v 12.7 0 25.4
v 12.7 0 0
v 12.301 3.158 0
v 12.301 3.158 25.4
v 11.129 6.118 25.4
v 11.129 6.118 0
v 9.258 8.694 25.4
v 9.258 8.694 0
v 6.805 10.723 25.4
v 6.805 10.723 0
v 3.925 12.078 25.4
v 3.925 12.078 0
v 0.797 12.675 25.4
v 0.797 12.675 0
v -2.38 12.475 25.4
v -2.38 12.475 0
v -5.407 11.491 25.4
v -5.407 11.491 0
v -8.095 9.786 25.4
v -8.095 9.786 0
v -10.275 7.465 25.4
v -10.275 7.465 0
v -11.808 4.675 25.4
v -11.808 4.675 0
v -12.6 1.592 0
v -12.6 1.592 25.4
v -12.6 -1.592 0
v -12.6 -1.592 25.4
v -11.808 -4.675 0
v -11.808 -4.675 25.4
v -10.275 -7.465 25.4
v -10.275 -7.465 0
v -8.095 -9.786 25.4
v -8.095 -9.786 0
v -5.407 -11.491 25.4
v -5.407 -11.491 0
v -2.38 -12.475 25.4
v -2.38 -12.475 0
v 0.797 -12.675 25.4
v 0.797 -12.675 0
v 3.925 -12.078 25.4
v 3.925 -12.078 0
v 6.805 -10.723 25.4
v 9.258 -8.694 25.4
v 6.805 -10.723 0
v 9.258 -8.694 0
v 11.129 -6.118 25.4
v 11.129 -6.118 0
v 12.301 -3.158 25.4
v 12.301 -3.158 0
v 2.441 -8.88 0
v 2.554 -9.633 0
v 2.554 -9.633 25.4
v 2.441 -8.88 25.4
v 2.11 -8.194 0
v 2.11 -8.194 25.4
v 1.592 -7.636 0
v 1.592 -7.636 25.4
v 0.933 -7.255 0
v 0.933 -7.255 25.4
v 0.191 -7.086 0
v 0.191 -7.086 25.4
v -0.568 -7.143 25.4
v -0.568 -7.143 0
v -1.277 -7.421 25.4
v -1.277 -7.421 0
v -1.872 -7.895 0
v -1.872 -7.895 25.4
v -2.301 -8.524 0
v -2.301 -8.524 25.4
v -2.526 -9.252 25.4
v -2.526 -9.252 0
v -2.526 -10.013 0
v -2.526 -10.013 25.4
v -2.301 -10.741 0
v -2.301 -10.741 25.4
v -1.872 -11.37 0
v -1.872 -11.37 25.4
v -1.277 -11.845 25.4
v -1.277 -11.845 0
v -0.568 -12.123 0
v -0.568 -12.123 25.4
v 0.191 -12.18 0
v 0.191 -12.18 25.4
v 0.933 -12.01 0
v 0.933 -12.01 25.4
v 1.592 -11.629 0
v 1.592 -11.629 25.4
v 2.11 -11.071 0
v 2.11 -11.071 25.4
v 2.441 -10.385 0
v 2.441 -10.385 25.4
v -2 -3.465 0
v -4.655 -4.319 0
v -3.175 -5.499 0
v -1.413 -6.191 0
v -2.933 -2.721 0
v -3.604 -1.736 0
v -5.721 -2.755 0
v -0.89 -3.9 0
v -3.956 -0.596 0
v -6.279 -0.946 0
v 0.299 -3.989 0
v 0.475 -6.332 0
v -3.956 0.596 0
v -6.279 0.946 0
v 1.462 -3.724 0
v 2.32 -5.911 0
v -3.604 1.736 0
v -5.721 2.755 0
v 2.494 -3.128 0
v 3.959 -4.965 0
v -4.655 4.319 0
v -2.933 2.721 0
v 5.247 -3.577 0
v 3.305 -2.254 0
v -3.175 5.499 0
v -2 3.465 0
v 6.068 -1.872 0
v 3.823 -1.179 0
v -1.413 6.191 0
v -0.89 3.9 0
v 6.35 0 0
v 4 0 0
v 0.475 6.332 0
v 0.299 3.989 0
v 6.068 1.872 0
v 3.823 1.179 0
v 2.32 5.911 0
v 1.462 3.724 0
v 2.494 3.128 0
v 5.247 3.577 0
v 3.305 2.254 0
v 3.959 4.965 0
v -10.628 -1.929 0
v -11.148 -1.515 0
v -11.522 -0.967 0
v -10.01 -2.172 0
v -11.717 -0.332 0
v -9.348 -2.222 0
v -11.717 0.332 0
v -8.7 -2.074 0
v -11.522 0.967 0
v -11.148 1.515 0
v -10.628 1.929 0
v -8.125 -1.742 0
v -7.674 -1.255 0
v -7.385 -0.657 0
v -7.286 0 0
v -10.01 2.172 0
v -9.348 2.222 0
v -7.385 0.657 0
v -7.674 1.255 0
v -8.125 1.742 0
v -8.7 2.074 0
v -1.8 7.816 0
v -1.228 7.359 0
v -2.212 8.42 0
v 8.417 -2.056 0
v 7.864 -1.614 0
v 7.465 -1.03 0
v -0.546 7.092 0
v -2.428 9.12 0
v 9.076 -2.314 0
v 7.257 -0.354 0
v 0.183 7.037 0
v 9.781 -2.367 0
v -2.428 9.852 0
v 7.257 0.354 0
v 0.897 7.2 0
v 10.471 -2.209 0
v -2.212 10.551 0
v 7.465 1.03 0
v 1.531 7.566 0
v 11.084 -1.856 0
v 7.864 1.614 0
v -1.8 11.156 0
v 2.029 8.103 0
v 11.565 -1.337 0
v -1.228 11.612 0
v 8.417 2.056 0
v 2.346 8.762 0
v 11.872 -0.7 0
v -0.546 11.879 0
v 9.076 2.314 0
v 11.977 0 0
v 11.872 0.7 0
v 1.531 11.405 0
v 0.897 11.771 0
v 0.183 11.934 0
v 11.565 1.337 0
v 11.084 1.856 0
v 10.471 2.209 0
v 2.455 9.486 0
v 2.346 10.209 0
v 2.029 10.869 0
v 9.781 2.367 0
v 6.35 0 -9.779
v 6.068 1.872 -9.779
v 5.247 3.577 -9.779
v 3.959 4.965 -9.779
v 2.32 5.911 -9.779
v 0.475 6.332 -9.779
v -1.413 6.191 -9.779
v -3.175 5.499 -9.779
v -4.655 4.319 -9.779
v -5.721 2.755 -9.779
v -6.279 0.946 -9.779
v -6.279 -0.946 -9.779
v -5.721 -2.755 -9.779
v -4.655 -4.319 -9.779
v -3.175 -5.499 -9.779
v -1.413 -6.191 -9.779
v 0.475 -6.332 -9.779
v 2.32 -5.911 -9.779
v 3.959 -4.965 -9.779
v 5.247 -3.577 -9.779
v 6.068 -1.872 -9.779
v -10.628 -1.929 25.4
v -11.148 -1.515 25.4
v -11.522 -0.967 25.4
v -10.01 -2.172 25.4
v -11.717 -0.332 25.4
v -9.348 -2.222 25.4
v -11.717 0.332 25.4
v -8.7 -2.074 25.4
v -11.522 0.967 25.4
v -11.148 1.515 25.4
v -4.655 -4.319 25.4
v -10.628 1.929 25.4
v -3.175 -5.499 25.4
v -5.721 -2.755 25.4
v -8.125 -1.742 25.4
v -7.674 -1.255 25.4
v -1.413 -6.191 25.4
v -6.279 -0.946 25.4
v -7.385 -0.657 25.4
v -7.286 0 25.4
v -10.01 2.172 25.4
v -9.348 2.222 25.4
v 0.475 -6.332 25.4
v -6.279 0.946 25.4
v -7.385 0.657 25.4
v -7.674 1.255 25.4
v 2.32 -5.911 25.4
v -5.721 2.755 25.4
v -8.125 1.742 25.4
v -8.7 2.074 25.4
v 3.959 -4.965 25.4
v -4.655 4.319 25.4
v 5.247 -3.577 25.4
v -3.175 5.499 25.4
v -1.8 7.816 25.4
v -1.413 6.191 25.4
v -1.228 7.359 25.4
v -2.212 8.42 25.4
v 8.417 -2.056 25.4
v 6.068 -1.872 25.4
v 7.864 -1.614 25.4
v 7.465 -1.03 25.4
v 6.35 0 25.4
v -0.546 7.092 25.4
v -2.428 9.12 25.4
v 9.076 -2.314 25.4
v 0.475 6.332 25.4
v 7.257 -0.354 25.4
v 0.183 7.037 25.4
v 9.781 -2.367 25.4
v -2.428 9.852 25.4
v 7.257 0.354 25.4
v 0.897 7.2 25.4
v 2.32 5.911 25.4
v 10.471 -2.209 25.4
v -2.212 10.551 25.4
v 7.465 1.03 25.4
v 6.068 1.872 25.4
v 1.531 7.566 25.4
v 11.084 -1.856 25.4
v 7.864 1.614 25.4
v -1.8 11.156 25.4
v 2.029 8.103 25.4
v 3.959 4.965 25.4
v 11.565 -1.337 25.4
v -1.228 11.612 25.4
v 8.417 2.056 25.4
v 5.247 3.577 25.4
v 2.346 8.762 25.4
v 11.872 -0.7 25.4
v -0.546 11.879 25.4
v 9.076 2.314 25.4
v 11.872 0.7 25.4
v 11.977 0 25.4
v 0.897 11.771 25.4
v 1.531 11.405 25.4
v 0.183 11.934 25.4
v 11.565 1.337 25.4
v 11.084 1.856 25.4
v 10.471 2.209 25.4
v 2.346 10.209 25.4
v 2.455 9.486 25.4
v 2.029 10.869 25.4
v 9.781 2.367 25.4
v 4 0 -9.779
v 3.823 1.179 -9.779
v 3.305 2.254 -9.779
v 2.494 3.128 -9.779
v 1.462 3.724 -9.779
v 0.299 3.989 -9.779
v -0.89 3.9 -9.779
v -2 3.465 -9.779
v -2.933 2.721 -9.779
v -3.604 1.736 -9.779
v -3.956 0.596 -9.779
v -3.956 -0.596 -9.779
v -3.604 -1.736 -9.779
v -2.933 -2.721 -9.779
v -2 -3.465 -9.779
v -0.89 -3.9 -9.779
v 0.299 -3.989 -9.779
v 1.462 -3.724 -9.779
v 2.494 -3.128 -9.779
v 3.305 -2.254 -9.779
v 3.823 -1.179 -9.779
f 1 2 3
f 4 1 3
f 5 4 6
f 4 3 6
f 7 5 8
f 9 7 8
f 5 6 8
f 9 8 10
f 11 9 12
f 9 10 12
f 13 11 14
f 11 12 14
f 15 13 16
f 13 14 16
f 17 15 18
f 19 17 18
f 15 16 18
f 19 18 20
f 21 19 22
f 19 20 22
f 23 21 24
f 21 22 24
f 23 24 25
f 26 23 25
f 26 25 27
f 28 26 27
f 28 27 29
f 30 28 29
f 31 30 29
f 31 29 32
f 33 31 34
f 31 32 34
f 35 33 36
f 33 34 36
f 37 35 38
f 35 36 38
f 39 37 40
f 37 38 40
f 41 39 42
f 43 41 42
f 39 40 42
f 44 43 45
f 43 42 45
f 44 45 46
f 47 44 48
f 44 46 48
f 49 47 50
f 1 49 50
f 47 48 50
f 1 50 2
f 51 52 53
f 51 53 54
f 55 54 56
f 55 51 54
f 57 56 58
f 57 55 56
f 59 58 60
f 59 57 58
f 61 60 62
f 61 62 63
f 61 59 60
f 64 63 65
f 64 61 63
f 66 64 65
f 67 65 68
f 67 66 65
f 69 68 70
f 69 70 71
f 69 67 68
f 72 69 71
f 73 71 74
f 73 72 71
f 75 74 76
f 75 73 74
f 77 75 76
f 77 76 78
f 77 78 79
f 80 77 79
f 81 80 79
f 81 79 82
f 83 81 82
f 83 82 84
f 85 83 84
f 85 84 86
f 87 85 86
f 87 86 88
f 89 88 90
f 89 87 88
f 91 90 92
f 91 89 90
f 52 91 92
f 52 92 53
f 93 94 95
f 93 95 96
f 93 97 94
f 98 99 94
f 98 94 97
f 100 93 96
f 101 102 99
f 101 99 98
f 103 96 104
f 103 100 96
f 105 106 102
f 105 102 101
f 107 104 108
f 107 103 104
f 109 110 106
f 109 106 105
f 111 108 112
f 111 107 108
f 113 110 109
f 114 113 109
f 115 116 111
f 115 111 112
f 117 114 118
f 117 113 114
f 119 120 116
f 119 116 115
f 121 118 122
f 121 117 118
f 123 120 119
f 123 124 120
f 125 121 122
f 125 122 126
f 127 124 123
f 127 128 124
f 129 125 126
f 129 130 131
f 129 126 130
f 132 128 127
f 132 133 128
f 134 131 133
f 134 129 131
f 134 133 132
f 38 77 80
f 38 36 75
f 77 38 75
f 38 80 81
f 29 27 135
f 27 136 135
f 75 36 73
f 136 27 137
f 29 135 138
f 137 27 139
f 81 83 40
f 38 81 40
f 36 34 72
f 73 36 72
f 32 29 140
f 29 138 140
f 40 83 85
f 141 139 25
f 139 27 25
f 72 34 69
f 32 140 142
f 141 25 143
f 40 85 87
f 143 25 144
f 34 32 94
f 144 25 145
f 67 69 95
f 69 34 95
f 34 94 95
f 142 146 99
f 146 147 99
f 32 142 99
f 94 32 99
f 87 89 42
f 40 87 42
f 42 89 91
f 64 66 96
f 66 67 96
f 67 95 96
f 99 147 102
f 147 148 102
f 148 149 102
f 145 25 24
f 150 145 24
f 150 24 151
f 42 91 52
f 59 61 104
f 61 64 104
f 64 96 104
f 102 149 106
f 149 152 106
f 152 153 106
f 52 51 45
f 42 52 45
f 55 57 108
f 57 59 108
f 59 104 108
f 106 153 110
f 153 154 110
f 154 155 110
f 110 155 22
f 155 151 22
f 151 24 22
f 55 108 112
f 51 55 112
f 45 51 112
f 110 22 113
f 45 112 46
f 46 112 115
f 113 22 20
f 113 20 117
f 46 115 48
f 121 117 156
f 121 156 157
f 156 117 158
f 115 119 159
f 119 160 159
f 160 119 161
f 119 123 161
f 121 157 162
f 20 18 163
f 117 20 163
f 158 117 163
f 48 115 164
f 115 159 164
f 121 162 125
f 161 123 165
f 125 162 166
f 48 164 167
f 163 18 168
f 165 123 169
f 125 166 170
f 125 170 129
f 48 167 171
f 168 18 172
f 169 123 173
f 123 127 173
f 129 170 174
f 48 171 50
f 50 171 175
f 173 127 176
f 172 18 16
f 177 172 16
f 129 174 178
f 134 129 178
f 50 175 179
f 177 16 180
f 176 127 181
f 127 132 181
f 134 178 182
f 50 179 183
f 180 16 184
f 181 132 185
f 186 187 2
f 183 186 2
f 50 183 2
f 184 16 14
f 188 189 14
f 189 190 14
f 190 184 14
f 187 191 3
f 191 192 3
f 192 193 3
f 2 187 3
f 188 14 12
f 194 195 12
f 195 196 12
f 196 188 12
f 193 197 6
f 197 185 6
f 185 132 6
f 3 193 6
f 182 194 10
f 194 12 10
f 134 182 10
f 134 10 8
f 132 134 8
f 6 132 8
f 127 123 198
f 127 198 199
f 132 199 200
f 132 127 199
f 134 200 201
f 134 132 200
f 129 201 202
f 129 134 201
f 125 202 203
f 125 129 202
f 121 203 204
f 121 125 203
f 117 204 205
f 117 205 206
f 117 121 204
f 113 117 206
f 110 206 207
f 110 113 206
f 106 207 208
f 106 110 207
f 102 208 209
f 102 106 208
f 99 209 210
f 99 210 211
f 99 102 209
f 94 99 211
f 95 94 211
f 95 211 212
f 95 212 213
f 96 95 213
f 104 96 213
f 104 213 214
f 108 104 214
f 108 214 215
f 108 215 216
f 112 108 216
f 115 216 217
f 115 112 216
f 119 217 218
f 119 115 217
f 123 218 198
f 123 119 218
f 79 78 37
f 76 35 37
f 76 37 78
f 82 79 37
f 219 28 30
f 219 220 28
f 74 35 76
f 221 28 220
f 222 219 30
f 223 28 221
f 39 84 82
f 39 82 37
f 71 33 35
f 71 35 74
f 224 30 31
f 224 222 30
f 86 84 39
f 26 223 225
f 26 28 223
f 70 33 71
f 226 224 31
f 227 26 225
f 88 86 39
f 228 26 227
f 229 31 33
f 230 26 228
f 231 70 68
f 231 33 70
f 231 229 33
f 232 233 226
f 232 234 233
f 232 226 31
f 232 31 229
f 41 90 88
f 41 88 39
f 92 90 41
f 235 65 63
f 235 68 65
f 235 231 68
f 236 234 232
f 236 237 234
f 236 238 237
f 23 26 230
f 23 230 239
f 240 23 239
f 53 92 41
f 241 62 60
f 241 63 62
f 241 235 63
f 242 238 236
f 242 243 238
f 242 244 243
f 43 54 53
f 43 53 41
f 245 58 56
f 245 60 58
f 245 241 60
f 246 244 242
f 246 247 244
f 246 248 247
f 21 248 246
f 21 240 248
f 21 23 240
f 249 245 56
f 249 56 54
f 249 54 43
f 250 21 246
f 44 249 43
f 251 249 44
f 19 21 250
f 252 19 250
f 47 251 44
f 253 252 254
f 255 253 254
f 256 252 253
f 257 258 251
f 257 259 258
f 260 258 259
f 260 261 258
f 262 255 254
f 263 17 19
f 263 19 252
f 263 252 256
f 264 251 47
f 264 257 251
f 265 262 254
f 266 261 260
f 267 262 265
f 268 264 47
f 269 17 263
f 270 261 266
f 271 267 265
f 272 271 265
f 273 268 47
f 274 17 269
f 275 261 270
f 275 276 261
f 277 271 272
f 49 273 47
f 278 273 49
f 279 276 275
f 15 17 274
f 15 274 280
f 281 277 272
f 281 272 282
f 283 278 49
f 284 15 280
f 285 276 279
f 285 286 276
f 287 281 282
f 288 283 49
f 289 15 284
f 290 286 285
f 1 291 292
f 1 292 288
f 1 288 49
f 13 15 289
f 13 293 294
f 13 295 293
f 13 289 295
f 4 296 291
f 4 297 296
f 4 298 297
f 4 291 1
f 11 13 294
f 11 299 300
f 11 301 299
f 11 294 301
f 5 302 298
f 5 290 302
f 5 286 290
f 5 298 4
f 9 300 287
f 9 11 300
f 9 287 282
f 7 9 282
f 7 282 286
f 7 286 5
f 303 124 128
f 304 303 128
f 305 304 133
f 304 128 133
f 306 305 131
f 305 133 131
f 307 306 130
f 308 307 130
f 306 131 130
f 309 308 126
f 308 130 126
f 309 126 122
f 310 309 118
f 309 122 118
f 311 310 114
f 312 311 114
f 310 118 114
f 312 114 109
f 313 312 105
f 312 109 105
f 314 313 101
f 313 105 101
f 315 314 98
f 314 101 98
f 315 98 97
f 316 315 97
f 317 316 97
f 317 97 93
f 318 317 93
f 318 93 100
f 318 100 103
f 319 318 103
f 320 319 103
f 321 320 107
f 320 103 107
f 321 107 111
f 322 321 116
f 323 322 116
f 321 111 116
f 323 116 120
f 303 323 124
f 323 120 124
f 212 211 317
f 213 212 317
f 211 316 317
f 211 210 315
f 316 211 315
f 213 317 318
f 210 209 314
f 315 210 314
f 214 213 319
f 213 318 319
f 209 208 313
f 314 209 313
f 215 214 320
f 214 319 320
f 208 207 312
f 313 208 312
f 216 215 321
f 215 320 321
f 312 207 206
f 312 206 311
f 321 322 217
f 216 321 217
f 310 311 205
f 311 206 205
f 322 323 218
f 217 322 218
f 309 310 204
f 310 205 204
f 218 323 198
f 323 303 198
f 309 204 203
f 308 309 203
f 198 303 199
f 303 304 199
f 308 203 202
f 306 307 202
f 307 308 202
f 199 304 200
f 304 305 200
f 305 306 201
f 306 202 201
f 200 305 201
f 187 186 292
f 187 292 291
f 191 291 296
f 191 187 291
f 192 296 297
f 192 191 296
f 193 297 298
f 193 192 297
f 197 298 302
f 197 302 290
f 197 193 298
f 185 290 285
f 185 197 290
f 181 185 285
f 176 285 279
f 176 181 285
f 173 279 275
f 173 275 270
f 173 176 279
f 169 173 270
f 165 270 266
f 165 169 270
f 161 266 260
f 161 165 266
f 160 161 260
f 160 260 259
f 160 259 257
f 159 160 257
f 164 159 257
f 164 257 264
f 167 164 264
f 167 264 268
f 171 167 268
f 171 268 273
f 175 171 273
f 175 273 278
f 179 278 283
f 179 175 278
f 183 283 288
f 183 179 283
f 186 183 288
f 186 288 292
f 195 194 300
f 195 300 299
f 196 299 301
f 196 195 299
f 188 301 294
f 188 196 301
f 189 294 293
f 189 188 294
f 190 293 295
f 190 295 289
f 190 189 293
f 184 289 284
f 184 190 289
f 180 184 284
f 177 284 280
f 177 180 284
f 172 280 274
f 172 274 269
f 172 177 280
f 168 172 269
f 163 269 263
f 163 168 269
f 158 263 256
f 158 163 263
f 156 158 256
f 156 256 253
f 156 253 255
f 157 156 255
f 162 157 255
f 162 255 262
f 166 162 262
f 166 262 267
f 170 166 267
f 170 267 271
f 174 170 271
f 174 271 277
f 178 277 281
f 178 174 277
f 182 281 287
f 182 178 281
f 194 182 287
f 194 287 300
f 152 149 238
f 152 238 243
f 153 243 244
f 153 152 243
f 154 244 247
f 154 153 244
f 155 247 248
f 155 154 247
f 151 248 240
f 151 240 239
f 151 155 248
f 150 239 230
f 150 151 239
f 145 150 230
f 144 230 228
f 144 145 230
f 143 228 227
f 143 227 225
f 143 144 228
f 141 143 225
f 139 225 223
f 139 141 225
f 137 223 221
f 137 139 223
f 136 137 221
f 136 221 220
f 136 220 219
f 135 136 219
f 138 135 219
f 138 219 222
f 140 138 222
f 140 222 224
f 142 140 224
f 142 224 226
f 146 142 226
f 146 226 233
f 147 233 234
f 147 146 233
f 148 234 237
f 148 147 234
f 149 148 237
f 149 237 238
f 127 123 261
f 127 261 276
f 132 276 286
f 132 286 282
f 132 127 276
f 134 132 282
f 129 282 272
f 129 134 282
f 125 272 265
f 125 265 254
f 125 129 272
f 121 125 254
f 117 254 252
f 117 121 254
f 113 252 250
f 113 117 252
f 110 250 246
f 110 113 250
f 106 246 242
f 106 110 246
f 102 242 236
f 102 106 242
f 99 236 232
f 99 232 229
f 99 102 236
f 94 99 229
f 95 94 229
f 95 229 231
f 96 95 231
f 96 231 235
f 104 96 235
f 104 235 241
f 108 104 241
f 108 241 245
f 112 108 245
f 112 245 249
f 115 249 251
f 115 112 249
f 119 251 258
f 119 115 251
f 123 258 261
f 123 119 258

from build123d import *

# Parameters (mm, degrees)
F0_R     = 6.35
F0_R_2   = 4.0005
F1_DEPTH = 9.779
F0_R_3   = 12.7
F0_R_4   = 2.554087
F0_R_5   = 2.227925
F0_R_6   = 2.37351
F0_R_7   = 2.455152
F2_DEPTH = 25.4


with BuildPart() as f1:
    # F0 (on Top) → F1 (new body)
    with BuildSketch(Plane.XY):
        Circle(F0_R)
        Circle(F0_R_2, mode=Mode.SUBTRACT)
    extrude(amount=-F1_DEPTH)

    # F0 (on Top) → F2 (join)
    with BuildSketch(Plane.XY):
        Circle(F0_R_3)
        with Locations((0, -9.63263)):
            Circle(F0_R_4, mode=Mode.SUBTRACT)
        with Locations((-9.514348, 0)):
            Circle(F0_R_5, mode=Mode.SUBTRACT)
        Circle(F0_R, mode=Mode.SUBTRACT)
        with Locations((9.603927, 0)):
            Circle(F0_R_6, mode=Mode.SUBTRACT)
        with Locations((0, 9.485645)):
            Circle(F0_R_7, mode=Mode.SUBTRACT)
    extrude(amount=F2_DEPTH)


solid = f1.part
